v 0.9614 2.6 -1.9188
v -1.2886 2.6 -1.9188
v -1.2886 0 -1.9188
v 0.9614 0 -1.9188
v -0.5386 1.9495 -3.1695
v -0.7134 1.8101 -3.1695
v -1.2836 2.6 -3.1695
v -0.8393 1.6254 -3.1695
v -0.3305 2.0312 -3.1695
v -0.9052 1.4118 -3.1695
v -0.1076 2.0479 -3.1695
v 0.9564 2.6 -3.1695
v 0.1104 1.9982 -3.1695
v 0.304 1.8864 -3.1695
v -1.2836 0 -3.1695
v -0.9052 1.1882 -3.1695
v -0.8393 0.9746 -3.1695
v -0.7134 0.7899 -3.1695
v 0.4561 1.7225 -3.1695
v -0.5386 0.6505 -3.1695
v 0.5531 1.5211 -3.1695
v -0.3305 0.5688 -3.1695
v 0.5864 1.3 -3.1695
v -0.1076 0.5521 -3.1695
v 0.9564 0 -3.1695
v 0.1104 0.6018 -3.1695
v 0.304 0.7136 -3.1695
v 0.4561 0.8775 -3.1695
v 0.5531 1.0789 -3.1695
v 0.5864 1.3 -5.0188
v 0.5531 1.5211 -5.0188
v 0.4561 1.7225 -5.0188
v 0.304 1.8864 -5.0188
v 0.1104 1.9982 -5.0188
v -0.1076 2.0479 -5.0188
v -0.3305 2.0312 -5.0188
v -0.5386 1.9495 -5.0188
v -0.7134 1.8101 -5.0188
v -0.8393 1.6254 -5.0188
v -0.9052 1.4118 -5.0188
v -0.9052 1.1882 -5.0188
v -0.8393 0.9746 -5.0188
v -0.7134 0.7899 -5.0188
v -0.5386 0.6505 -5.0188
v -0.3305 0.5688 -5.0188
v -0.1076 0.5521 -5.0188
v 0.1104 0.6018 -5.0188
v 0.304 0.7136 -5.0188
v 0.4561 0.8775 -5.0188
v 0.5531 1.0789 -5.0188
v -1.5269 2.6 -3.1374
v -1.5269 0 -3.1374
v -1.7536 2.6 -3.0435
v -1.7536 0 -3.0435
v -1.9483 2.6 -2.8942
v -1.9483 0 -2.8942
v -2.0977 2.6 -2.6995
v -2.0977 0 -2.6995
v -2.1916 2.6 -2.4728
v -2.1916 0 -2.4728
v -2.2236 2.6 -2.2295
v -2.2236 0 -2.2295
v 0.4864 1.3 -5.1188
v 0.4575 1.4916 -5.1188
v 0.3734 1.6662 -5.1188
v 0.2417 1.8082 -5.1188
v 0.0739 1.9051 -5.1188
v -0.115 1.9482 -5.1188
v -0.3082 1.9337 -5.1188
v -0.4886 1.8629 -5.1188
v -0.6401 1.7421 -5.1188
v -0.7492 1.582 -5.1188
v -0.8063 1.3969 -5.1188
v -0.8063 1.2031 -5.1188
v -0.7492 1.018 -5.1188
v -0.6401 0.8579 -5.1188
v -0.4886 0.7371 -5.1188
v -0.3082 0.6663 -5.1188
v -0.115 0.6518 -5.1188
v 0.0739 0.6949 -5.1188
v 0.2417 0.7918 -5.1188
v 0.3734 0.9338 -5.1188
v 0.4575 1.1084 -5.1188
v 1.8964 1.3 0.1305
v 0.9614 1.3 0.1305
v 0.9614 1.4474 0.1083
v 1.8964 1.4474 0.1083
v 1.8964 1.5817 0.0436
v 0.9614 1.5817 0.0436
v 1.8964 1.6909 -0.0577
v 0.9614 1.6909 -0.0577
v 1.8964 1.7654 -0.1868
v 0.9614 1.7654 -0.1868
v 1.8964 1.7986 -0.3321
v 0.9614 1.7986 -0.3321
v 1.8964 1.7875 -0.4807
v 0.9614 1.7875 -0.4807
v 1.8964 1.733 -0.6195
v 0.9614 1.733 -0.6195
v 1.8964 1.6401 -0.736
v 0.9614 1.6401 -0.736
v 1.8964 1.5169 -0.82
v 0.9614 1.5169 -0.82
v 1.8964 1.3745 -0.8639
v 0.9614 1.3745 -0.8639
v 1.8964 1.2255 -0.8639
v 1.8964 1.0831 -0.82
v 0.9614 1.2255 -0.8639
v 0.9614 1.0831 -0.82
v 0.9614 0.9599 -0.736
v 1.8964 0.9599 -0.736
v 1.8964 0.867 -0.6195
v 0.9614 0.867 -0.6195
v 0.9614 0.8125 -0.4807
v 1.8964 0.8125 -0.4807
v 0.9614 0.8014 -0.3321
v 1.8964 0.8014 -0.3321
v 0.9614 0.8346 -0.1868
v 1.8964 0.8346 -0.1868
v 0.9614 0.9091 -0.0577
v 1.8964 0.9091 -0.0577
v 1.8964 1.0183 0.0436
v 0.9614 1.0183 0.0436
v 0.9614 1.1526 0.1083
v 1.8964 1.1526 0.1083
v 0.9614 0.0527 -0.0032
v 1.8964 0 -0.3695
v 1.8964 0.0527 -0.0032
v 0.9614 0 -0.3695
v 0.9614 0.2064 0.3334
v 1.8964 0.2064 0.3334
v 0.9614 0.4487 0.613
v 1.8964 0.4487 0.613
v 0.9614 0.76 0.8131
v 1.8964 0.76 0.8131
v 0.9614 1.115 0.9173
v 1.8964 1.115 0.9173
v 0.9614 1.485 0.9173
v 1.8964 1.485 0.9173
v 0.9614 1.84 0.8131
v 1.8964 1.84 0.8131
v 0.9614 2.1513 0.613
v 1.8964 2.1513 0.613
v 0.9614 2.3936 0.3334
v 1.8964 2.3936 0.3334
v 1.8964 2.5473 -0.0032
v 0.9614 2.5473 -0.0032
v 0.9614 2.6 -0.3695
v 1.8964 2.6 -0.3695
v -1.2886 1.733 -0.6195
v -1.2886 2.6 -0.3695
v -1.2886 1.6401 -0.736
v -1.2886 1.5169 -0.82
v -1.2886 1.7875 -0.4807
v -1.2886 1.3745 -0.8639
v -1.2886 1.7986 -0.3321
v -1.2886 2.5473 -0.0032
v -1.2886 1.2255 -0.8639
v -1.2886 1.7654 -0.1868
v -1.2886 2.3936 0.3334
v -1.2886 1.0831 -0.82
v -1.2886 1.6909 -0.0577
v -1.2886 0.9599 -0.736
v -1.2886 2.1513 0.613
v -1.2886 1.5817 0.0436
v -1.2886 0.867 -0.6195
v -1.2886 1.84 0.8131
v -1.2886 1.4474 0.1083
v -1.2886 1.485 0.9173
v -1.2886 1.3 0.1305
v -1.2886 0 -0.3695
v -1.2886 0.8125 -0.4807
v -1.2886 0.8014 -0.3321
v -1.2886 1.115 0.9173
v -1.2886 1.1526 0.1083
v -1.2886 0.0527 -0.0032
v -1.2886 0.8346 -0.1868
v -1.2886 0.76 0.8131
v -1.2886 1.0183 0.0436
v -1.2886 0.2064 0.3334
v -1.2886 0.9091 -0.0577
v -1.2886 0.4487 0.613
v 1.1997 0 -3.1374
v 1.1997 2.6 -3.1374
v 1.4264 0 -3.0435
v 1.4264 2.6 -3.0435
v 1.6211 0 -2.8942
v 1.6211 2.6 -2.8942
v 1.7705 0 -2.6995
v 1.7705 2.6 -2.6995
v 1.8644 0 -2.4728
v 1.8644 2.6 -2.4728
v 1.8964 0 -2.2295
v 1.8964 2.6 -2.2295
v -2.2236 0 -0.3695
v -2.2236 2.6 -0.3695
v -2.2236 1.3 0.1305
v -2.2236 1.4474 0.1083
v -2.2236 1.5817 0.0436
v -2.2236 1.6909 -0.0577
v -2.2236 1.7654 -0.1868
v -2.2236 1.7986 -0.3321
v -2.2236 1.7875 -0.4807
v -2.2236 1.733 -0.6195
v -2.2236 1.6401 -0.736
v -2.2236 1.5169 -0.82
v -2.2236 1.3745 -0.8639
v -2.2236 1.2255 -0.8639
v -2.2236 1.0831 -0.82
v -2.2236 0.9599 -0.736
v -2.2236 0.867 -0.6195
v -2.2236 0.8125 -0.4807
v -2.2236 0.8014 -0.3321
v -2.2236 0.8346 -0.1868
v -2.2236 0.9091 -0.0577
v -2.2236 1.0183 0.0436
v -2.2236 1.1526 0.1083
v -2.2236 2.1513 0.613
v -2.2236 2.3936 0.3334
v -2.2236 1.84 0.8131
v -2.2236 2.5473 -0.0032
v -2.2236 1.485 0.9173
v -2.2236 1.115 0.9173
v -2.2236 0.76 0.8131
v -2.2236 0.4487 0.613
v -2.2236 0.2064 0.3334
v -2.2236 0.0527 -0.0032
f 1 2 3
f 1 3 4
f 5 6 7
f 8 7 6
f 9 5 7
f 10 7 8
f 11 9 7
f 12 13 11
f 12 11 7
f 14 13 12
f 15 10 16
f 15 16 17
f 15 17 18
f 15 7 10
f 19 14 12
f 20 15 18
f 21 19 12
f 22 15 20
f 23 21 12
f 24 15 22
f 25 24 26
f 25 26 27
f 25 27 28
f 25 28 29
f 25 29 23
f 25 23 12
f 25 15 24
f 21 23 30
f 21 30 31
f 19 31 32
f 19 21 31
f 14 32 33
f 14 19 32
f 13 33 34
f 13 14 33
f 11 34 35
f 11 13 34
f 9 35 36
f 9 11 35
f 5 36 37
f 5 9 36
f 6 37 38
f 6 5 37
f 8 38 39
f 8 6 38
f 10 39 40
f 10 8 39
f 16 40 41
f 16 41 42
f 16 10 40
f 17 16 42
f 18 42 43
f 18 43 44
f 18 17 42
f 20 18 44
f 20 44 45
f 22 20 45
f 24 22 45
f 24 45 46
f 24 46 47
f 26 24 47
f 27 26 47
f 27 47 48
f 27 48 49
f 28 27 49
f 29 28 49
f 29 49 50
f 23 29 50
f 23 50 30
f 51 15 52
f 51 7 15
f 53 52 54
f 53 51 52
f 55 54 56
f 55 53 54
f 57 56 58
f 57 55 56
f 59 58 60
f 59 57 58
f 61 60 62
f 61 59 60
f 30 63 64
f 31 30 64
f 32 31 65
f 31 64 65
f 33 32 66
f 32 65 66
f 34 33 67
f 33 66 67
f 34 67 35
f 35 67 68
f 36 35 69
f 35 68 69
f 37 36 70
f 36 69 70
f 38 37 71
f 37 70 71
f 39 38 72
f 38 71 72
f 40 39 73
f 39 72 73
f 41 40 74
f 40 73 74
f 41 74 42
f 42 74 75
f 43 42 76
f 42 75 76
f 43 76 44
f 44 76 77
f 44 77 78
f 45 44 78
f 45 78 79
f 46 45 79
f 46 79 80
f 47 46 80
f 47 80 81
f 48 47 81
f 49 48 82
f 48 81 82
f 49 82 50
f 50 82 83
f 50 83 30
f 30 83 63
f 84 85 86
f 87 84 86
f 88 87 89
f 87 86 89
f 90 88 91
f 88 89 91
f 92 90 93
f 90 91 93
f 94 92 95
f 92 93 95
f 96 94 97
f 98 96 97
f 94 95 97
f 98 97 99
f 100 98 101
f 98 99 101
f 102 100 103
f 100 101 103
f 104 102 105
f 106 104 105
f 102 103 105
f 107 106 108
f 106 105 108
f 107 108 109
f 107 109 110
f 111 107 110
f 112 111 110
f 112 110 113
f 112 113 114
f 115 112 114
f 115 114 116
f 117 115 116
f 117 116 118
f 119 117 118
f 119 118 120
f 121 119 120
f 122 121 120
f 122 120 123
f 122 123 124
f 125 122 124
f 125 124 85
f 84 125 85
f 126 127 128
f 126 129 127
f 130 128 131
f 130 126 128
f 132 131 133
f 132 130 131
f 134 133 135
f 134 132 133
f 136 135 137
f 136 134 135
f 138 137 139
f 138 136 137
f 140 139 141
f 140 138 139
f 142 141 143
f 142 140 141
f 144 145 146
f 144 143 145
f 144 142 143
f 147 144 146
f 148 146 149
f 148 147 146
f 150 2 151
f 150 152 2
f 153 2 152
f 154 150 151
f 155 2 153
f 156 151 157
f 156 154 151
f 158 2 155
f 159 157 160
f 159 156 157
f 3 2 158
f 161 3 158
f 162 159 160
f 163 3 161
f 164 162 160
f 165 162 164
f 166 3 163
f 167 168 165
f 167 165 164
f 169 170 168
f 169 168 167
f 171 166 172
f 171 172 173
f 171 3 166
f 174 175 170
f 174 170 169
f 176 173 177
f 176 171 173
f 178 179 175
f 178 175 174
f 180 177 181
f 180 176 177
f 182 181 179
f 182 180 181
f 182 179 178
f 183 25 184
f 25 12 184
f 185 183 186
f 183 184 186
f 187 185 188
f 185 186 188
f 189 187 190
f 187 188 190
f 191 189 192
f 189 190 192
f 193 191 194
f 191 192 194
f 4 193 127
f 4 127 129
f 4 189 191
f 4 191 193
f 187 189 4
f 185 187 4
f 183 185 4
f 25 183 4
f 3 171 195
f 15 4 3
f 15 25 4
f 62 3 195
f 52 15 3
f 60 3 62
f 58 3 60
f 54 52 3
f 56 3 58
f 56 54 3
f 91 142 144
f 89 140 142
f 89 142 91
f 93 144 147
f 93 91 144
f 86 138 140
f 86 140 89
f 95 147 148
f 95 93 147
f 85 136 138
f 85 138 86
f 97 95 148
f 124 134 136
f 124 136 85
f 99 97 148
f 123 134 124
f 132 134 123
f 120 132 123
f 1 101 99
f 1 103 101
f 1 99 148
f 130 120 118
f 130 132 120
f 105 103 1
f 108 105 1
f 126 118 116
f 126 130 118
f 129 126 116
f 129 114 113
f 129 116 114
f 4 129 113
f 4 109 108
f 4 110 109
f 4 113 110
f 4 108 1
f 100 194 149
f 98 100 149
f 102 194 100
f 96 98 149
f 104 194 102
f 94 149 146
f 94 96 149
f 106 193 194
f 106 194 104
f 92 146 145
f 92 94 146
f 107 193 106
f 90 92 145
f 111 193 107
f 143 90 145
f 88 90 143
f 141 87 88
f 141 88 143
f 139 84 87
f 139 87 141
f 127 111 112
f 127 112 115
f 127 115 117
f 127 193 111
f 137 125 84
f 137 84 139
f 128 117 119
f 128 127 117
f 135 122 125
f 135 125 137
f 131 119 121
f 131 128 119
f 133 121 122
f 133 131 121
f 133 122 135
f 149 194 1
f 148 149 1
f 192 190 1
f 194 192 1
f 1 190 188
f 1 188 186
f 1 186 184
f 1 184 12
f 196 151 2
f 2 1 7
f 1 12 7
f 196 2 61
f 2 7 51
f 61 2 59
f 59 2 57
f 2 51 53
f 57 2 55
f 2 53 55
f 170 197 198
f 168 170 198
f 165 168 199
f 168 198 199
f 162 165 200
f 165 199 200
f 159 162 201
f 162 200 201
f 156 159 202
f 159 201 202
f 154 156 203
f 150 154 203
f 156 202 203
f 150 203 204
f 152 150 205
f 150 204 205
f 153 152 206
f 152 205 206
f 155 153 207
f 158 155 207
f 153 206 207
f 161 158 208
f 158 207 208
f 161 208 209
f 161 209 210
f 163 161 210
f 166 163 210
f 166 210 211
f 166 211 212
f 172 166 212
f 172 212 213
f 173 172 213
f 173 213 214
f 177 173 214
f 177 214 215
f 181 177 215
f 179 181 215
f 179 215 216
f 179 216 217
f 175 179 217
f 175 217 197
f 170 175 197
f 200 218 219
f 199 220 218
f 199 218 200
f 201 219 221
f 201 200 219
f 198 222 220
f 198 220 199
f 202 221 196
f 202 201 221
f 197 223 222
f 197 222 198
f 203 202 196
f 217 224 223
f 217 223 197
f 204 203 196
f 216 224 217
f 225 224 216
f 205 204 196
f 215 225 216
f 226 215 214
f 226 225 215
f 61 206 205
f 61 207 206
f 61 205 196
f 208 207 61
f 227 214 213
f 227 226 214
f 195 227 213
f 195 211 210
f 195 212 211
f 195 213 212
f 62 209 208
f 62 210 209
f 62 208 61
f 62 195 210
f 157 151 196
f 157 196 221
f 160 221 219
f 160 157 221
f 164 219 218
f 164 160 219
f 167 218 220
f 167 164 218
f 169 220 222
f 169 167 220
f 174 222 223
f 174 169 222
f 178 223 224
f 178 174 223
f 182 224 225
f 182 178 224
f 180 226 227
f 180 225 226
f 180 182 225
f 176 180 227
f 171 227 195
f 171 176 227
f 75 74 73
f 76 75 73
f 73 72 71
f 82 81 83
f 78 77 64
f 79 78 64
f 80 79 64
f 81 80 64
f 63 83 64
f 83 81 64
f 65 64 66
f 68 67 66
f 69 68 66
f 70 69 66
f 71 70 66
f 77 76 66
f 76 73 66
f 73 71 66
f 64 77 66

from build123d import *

# Parameters (mm, degrees)
SALIENTE_EXTRUIR2_DEPTH = 2.6
REDONDEO1_RADIUS        = 1.3
REDONDEO1_LENGTH        = 0.935
REDONDEO2_RADIUS        = 1.3
REDONDEO2_LENGTH        = 0.935
CROQUIS2_R              = 0.5
CORTAR_EXTRUIR1_DEPTH   = 6.812051501
REDONDEO4_R             = 0.94
CROQUIS3_R              = 0.75
SALIENTE_EXTRUIR3_DEPTH = 3.2
CHAFL_N1_SIZE           = 0.1


with BuildPart() as part:
    # Croquis1 → Saliente-Extruir2 (new body)
    with BuildSketch(Plane(origin=(0, 0, 0), x_dir=(1, 0, 0), z_dir=(0, 1, 0))):
        Polygon((-2.223605772, 3.169470405), (1.896394228, 3.169470405), (1.896394228, -0.930529595), (0.961394228, -0.930529595), (0.961394228, 1.918816199), (-1.288605772, 1.918816199), (-1.288605772, -0.930529595), (-2.223605772, -0.930529595), align=None)
    extrude(amount=SALIENTE_EXTRUIR2_DEPTH)

    # Redondeo1: full round fillet: the end face becomes a half cylinder, R = half its width
    redondeo1_face = Plane((1.428894228, 1.3, 0.930529595), x_dir=(-1, 0, 0), z_dir=(0, 0, 1))  # on the end face: x along it, z out of the body
    redondeo1_slab = redondeo1_face.offset(-REDONDEO1_RADIUS / 2) * Box(REDONDEO1_LENGTH, 2 * REDONDEO1_RADIUS, REDONDEO1_RADIUS, mode=Mode.PRIVATE)  # the body's end, R deep
    redondeo1_round = Plane((1.428894228, 1.3, -0.369470405), x_dir=(0, 0, 1), z_dir=(-1, 0, 0)) * Cylinder(REDONDEO1_RADIUS, REDONDEO1_LENGTH, mode=Mode.PRIVATE)  # its axis R under the face
    add(redondeo1_slab - redondeo1_round, mode=Mode.SUBTRACT)

    # Redondeo2: full round fillet: the end face becomes a half cylinder, R = half its width
    redondeo2_face = Plane((-1.756105772, 1.3, 0.930529595), x_dir=(1, 0, 0), z_dir=(0, 0, 1))  # on the end face: x along it, z out of the body
    redondeo2_slab = redondeo2_face.offset(-REDONDEO2_RADIUS / 2) * Box(REDONDEO2_LENGTH, 2 * REDONDEO2_RADIUS, REDONDEO2_RADIUS, mode=Mode.PRIVATE)  # the body's end, R deep
    redondeo2_round = Plane((-1.756105772, 1.3, -0.369470405), x_dir=(0, 0, 1), z_dir=(1, 0, 0)) * Cylinder(REDONDEO2_RADIUS, REDONDEO2_LENGTH, mode=Mode.PRIVATE)  # its axis R under the face
    add(redondeo2_slab - redondeo2_round, mode=Mode.SUBTRACT)

    # Croquis2 → Cortar-Extruir1 (cut, through all)
    with BuildSketch(Plane.ZY.offset(2.223605772)):
        with Locations((-0.369470405, 1.3)):
            Circle(CROQUIS2_R)
    extrude(amount=-CORTAR_EXTRUIR1_DEPTH, mode=Mode.SUBTRACT)

    # Redondeo4
    redondeo4_edges = [part.edges().sort_by_distance(p)[0] for p in [
        (-2.223605772, 1.3, -3.169470405),
        (1.896394228, 1.3, -3.169470405),
    ]]
    fillet(redondeo4_edges, radius=REDONDEO4_R)

    # Croquis3 → Saliente-Extruir3 (add)
    with BuildSketch(Plane.XY.offset(-1.918816199)):
        with Locations((-0.163605772, 1.3)):
            Circle(CROQUIS3_R)
    extrude(amount=-SALIENTE_EXTRUIR3_DEPTH)

    # Chaflán1
    chafl_n1_edges = [part.edges().sort_by_distance(p)[0] for p in [
        (-0.913605772, 1.3, -5.118816199),
    ]]
    chamfer(chafl_n1_edges, length=CHAFL_N1_SIZE)


solid = part.part
